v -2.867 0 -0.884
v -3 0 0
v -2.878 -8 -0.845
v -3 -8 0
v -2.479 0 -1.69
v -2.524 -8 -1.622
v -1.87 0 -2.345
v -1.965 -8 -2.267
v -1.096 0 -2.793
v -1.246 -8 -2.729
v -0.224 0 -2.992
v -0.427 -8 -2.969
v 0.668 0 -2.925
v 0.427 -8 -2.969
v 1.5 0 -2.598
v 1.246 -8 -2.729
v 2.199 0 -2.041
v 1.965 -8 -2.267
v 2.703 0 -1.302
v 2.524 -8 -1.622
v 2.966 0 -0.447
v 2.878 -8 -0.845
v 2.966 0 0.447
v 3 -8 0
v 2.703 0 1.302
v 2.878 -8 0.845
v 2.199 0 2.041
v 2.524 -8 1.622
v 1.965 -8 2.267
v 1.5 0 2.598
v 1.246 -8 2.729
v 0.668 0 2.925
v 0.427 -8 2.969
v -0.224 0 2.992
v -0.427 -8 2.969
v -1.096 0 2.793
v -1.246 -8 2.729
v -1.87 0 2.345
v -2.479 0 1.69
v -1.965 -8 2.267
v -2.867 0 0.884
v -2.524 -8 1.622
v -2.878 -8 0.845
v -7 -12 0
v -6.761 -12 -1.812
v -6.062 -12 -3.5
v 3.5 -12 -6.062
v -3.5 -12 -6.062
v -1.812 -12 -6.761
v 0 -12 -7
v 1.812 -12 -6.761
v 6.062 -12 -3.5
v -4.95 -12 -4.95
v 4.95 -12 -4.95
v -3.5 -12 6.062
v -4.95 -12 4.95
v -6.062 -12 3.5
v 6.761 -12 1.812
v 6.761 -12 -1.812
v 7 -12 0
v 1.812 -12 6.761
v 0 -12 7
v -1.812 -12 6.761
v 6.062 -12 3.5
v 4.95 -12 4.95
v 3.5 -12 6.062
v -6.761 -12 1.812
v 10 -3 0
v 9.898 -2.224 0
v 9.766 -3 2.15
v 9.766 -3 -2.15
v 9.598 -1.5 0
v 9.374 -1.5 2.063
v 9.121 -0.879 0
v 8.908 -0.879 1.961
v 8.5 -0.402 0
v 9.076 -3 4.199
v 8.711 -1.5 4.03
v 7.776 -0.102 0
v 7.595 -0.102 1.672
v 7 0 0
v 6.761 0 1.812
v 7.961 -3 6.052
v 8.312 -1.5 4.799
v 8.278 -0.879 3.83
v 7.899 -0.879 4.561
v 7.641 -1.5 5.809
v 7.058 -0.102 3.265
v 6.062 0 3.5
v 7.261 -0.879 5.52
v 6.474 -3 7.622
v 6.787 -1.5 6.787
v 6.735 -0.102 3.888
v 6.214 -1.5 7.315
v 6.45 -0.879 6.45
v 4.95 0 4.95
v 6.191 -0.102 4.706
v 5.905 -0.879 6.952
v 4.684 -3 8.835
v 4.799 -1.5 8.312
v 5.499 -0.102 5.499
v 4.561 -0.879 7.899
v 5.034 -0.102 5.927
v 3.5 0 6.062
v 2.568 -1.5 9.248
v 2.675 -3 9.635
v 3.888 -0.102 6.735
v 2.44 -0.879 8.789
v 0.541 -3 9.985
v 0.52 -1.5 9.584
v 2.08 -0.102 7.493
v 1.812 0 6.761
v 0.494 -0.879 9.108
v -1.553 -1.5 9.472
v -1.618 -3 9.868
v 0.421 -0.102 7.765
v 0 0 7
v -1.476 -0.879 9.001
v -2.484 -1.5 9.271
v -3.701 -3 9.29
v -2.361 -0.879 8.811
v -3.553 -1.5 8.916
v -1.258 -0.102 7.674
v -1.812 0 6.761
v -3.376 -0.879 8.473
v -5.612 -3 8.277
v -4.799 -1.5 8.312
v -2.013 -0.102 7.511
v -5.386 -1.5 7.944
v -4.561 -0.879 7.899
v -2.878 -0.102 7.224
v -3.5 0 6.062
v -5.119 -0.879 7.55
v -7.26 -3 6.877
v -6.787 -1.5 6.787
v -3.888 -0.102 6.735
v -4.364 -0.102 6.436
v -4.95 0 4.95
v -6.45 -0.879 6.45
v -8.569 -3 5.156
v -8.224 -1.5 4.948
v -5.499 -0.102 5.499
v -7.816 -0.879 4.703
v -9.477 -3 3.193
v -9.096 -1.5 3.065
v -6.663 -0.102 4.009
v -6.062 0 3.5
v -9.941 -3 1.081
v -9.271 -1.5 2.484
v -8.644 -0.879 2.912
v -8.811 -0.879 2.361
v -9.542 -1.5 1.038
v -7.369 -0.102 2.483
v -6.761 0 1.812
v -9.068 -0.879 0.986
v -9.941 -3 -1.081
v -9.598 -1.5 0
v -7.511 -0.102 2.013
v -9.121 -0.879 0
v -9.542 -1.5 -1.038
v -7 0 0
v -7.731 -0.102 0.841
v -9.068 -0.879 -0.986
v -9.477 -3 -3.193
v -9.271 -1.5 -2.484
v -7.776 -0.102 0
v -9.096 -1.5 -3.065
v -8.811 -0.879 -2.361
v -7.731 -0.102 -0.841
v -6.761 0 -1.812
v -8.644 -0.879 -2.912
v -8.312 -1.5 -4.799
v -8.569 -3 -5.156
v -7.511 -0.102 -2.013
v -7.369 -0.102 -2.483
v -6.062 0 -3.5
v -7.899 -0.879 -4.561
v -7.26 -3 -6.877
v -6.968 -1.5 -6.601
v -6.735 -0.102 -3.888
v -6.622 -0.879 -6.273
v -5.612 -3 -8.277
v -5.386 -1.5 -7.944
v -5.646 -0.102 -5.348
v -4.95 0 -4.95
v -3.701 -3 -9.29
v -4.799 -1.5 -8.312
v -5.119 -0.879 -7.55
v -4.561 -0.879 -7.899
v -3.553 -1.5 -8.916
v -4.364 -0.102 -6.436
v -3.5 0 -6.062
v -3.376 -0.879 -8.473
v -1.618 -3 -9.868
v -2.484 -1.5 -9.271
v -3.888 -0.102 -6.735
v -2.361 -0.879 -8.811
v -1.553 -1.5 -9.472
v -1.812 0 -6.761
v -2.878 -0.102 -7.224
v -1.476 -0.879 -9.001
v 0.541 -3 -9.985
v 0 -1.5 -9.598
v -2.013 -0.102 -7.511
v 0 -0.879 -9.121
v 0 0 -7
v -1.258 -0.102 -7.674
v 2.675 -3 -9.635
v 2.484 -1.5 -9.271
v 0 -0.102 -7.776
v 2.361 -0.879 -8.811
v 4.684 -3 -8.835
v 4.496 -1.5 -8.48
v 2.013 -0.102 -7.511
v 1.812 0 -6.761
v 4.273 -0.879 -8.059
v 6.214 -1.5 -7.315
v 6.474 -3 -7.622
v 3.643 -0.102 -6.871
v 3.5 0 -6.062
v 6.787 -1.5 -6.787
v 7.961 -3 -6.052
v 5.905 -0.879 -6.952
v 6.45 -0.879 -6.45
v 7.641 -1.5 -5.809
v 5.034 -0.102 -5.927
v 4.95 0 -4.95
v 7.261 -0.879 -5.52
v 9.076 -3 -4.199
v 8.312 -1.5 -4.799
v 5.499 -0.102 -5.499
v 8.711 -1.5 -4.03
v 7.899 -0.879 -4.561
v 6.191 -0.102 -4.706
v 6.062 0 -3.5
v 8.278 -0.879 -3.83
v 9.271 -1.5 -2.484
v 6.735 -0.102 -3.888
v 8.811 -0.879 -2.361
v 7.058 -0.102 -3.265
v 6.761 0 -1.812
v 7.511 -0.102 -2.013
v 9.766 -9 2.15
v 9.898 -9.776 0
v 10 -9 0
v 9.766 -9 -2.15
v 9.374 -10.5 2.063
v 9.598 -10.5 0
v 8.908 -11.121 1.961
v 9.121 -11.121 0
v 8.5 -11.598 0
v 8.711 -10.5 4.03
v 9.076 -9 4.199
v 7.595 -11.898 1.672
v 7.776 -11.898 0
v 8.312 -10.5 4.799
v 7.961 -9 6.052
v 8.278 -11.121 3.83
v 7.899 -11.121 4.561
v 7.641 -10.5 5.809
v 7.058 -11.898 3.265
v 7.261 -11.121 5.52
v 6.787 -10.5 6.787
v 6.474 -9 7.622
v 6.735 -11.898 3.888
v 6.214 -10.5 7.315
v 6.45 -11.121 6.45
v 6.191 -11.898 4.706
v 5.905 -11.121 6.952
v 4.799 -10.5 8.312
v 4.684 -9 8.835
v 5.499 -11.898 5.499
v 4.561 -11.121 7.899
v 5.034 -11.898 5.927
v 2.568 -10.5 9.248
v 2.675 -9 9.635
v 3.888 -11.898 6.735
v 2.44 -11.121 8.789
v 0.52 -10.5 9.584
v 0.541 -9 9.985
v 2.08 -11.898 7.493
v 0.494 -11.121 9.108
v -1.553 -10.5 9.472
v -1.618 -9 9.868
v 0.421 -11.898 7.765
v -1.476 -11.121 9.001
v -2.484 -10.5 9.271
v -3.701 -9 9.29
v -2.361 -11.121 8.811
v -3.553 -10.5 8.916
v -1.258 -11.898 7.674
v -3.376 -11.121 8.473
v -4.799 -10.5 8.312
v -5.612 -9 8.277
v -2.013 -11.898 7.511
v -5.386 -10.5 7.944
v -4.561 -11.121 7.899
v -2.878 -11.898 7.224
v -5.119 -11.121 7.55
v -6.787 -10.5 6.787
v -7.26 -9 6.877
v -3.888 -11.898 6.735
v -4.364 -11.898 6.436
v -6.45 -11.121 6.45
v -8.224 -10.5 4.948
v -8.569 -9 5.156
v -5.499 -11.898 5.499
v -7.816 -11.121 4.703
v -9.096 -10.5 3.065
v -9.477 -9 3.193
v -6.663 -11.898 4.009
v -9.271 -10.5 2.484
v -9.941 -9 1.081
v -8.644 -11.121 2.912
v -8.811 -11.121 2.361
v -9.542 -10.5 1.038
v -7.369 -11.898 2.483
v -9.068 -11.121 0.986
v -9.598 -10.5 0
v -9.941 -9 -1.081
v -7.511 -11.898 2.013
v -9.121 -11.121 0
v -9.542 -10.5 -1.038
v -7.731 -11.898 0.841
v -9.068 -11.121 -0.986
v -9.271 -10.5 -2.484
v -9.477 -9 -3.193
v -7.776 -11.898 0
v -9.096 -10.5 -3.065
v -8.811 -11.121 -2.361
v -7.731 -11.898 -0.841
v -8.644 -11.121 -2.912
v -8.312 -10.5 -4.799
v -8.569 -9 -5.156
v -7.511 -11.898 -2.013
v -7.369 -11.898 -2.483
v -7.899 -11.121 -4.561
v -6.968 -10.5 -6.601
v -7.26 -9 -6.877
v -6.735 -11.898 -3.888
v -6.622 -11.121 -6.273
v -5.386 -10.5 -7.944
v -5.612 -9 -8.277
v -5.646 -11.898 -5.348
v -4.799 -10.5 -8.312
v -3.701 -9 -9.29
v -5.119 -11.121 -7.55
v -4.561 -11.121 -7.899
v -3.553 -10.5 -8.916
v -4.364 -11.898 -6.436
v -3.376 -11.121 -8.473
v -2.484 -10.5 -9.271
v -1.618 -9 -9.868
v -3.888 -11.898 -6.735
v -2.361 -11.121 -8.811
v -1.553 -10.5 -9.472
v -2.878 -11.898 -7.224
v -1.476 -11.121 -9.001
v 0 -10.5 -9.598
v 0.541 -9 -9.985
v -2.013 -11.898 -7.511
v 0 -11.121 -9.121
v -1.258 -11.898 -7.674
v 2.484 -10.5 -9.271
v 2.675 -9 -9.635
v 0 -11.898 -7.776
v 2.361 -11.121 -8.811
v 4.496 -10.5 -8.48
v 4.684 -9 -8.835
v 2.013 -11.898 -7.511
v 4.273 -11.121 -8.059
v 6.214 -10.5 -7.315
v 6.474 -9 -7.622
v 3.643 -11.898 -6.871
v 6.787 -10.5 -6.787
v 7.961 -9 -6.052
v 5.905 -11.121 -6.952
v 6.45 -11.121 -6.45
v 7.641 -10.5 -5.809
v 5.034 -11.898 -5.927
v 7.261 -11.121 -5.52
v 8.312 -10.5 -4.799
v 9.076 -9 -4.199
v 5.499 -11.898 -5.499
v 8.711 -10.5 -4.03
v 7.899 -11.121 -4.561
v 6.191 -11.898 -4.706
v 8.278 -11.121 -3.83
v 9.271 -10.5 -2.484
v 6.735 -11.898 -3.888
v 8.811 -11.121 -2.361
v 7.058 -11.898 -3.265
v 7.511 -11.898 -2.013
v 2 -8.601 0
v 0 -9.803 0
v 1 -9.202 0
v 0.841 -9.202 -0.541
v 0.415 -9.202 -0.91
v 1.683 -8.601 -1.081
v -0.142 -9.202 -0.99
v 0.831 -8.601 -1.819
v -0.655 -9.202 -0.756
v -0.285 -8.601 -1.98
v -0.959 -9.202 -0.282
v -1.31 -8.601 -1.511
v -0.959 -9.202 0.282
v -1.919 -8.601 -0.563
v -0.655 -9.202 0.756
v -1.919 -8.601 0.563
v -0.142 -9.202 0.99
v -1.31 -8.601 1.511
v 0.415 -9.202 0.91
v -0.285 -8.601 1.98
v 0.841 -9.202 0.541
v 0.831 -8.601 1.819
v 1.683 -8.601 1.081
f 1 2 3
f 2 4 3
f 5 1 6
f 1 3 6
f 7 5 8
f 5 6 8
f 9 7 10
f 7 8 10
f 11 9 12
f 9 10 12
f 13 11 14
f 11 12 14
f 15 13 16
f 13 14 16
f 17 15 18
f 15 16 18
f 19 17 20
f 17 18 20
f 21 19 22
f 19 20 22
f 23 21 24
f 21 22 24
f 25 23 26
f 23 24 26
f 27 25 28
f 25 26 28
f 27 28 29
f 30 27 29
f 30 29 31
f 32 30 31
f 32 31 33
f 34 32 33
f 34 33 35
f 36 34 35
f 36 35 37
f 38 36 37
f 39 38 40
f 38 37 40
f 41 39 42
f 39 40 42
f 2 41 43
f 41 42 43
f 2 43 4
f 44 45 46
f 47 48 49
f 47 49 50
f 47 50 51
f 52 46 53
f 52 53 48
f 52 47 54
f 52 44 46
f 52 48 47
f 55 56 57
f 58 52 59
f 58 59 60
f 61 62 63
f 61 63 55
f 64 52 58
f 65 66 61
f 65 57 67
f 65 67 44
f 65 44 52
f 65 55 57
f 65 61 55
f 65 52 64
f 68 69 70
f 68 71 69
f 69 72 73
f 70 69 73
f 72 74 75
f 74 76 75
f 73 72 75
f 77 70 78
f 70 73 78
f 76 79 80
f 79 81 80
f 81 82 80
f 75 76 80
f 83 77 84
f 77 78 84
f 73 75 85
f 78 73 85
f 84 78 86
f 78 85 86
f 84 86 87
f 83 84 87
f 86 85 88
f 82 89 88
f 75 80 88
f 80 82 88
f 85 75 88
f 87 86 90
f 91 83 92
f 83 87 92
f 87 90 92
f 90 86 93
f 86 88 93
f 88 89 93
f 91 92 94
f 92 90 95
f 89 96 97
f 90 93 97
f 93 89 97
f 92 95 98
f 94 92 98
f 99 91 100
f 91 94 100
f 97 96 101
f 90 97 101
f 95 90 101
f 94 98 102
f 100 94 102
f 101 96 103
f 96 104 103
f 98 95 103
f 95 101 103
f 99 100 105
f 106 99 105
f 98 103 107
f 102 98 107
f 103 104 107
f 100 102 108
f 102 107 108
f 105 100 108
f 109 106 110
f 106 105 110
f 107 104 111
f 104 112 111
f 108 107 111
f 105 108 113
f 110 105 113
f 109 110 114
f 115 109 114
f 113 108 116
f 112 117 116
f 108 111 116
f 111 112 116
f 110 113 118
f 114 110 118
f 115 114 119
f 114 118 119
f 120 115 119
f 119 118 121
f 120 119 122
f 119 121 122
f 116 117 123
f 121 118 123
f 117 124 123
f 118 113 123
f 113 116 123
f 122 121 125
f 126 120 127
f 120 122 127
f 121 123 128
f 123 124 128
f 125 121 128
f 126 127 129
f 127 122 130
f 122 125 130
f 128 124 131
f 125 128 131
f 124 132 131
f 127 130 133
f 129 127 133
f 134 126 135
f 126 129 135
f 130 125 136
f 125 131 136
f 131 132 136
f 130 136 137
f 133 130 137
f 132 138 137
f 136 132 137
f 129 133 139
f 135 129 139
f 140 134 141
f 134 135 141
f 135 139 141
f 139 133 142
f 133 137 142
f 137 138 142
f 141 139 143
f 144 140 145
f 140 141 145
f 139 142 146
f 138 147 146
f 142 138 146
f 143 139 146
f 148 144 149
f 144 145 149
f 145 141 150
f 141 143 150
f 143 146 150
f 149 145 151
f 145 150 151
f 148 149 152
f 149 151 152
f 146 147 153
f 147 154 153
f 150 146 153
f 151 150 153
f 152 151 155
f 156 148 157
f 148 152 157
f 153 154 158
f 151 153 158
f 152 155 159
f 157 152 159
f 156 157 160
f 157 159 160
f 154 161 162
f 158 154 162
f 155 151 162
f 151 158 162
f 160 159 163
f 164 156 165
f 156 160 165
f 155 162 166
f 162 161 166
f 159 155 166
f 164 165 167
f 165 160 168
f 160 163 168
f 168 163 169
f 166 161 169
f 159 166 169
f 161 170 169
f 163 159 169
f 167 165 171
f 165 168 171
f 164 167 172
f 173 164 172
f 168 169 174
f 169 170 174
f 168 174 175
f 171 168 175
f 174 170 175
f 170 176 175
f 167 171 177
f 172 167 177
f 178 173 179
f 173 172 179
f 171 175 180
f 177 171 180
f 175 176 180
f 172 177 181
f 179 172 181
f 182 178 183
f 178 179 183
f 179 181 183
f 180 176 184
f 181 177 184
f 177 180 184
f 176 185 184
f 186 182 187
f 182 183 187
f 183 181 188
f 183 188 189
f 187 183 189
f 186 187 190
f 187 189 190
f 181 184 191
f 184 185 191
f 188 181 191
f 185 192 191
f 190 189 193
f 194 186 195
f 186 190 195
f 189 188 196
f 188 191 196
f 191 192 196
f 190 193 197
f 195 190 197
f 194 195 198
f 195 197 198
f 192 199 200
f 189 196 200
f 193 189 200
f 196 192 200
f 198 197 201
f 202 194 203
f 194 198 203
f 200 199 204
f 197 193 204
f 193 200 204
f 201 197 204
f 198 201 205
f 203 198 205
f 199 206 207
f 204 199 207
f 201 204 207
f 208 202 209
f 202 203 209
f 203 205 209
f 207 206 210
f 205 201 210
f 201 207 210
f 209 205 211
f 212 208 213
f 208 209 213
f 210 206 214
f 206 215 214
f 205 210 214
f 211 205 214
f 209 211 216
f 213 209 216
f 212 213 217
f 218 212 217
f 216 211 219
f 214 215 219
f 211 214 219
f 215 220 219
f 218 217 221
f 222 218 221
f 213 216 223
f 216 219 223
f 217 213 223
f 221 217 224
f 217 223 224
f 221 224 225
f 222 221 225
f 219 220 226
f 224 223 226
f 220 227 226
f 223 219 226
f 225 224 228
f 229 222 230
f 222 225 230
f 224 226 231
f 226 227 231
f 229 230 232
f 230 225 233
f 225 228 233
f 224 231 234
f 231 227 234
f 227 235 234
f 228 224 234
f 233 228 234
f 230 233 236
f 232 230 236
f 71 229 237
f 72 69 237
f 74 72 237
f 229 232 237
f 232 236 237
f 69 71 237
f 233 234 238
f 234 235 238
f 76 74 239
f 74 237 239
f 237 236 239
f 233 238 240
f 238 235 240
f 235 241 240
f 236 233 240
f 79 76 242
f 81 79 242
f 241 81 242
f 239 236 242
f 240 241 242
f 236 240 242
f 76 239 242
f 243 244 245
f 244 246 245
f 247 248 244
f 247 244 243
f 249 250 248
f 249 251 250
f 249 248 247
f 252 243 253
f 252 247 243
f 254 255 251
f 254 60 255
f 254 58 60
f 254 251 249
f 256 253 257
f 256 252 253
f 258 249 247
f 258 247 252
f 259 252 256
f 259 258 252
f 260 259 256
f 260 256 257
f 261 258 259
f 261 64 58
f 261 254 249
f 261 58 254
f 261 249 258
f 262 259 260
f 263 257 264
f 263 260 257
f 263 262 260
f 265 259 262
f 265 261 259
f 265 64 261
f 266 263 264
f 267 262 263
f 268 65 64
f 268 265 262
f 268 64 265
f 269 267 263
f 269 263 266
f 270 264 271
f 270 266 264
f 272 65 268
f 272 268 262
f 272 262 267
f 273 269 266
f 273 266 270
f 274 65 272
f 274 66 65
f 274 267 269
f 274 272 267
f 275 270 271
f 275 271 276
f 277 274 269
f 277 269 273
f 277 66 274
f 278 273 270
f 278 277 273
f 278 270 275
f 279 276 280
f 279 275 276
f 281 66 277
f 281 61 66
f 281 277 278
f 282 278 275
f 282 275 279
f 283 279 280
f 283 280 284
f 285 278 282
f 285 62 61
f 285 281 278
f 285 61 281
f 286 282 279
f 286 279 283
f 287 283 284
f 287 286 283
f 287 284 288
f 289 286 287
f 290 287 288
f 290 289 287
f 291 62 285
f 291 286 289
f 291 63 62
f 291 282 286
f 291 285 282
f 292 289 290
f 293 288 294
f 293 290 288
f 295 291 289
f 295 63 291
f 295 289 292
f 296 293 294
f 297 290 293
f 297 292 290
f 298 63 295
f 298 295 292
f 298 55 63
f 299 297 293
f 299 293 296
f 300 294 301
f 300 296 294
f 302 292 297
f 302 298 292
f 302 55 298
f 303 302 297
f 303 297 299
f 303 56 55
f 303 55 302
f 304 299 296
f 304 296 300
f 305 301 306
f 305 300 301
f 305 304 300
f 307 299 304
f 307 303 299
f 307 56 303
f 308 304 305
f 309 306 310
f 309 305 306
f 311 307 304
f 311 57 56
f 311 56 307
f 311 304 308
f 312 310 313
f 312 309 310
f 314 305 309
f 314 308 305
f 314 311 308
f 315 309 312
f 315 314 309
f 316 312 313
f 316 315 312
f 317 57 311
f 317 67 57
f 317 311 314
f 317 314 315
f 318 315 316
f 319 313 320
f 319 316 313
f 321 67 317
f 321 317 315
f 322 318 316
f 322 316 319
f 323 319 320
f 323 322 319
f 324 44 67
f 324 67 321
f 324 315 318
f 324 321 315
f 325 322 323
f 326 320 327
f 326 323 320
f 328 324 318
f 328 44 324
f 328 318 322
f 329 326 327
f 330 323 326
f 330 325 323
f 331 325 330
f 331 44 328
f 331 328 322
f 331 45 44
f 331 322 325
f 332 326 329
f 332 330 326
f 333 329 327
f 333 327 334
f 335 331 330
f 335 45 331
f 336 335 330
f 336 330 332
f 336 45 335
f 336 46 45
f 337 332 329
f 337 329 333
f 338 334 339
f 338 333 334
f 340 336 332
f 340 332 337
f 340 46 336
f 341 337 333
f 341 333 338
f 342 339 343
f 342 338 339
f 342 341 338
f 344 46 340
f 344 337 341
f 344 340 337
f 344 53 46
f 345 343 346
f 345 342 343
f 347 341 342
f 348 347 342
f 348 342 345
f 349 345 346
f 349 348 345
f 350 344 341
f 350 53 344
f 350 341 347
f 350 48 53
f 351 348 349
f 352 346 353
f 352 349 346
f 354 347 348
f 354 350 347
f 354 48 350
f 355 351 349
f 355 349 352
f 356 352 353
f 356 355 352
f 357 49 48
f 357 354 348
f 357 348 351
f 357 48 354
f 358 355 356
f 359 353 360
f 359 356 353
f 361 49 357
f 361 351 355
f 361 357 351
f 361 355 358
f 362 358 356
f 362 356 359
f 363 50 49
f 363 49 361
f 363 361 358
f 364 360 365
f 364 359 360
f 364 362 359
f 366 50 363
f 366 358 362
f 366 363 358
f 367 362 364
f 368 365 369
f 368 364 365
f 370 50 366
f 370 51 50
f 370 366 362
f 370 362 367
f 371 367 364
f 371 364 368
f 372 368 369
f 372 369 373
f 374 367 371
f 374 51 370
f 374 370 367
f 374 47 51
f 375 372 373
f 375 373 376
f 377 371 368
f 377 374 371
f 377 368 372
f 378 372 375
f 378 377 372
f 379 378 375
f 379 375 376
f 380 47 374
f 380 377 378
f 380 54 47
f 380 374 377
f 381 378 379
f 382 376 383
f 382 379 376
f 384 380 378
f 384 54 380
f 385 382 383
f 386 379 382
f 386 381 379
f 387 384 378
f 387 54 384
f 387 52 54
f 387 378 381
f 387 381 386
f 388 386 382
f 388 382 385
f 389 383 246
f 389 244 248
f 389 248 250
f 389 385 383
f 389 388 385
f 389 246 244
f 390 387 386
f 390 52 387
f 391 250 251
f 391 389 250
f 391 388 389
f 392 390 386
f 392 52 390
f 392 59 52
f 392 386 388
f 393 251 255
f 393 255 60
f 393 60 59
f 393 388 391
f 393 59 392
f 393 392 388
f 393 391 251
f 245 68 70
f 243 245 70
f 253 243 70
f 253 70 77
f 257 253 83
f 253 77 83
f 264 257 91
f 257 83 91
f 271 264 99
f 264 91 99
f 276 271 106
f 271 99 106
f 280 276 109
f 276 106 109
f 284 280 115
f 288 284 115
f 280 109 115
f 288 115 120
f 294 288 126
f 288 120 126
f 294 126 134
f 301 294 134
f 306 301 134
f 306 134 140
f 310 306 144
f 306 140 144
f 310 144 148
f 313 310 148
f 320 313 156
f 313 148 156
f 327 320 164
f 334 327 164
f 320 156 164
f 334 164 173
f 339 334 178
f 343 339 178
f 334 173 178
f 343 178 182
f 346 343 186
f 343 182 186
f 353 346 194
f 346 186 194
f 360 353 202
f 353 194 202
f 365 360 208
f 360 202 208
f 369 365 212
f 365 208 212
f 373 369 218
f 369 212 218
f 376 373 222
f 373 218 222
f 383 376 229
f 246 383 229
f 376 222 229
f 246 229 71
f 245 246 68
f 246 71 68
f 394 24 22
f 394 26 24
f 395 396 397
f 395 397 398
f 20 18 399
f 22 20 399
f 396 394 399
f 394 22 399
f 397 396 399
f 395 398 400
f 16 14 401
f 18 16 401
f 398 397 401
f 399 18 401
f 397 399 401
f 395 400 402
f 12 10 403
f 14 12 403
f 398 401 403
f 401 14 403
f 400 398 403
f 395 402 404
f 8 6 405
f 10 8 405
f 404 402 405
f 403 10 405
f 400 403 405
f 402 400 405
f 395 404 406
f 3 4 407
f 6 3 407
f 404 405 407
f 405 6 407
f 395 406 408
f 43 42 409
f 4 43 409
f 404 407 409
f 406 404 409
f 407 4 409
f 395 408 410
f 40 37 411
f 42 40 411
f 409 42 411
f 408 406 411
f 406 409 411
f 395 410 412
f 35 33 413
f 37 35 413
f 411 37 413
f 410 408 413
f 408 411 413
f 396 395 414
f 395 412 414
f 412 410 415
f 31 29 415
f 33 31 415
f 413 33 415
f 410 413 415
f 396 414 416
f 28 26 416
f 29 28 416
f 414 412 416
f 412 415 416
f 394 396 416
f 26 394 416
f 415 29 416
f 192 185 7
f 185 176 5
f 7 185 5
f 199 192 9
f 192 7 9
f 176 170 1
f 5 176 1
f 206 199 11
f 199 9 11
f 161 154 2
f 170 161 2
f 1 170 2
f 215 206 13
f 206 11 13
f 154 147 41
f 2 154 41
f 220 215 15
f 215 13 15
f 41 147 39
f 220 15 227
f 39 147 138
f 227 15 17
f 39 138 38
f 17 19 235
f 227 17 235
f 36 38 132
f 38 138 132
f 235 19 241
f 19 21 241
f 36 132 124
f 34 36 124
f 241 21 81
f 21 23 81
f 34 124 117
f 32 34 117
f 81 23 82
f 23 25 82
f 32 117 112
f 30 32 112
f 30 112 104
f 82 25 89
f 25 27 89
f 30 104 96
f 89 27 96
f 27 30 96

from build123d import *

# Parameters (mm, degrees)
F0_R     = 10
F1_DEPTH = 12
F2_R     = 3
F4_D     = 6
F4_DEPTH = 8
F4_TIP   = 1.8025818571


with BuildPart() as f1:
    # F0 (on Front) → F1 (new body)
    with BuildSketch(Plane.XZ):
        Circle(F0_R)
    extrude(amount=F1_DEPTH)

    # F2
    f2_edges = [f1.edges().sort_by_distance(p)[0] for p in [
        (-10, 0, 0),
        (-10, -12, 0),
    ]]
    fillet(f2_edges, radius=F2_R)

    # F4
    with Locations(Plane(origin=(0, 0, 0), x_dir=(1, 0, 0), z_dir=(0, 1, 0))):
        with Locations((0, 0)):
            Hole(F4_D / 2, depth=F4_DEPTH)
            with Locations((0, 0, -(F4_DEPTH + F4_TIP / 2))):  # 118° drill point
                Cone(0, F4_D / 2, F4_TIP, mode=Mode.SUBTRACT)


solid = f1.part
